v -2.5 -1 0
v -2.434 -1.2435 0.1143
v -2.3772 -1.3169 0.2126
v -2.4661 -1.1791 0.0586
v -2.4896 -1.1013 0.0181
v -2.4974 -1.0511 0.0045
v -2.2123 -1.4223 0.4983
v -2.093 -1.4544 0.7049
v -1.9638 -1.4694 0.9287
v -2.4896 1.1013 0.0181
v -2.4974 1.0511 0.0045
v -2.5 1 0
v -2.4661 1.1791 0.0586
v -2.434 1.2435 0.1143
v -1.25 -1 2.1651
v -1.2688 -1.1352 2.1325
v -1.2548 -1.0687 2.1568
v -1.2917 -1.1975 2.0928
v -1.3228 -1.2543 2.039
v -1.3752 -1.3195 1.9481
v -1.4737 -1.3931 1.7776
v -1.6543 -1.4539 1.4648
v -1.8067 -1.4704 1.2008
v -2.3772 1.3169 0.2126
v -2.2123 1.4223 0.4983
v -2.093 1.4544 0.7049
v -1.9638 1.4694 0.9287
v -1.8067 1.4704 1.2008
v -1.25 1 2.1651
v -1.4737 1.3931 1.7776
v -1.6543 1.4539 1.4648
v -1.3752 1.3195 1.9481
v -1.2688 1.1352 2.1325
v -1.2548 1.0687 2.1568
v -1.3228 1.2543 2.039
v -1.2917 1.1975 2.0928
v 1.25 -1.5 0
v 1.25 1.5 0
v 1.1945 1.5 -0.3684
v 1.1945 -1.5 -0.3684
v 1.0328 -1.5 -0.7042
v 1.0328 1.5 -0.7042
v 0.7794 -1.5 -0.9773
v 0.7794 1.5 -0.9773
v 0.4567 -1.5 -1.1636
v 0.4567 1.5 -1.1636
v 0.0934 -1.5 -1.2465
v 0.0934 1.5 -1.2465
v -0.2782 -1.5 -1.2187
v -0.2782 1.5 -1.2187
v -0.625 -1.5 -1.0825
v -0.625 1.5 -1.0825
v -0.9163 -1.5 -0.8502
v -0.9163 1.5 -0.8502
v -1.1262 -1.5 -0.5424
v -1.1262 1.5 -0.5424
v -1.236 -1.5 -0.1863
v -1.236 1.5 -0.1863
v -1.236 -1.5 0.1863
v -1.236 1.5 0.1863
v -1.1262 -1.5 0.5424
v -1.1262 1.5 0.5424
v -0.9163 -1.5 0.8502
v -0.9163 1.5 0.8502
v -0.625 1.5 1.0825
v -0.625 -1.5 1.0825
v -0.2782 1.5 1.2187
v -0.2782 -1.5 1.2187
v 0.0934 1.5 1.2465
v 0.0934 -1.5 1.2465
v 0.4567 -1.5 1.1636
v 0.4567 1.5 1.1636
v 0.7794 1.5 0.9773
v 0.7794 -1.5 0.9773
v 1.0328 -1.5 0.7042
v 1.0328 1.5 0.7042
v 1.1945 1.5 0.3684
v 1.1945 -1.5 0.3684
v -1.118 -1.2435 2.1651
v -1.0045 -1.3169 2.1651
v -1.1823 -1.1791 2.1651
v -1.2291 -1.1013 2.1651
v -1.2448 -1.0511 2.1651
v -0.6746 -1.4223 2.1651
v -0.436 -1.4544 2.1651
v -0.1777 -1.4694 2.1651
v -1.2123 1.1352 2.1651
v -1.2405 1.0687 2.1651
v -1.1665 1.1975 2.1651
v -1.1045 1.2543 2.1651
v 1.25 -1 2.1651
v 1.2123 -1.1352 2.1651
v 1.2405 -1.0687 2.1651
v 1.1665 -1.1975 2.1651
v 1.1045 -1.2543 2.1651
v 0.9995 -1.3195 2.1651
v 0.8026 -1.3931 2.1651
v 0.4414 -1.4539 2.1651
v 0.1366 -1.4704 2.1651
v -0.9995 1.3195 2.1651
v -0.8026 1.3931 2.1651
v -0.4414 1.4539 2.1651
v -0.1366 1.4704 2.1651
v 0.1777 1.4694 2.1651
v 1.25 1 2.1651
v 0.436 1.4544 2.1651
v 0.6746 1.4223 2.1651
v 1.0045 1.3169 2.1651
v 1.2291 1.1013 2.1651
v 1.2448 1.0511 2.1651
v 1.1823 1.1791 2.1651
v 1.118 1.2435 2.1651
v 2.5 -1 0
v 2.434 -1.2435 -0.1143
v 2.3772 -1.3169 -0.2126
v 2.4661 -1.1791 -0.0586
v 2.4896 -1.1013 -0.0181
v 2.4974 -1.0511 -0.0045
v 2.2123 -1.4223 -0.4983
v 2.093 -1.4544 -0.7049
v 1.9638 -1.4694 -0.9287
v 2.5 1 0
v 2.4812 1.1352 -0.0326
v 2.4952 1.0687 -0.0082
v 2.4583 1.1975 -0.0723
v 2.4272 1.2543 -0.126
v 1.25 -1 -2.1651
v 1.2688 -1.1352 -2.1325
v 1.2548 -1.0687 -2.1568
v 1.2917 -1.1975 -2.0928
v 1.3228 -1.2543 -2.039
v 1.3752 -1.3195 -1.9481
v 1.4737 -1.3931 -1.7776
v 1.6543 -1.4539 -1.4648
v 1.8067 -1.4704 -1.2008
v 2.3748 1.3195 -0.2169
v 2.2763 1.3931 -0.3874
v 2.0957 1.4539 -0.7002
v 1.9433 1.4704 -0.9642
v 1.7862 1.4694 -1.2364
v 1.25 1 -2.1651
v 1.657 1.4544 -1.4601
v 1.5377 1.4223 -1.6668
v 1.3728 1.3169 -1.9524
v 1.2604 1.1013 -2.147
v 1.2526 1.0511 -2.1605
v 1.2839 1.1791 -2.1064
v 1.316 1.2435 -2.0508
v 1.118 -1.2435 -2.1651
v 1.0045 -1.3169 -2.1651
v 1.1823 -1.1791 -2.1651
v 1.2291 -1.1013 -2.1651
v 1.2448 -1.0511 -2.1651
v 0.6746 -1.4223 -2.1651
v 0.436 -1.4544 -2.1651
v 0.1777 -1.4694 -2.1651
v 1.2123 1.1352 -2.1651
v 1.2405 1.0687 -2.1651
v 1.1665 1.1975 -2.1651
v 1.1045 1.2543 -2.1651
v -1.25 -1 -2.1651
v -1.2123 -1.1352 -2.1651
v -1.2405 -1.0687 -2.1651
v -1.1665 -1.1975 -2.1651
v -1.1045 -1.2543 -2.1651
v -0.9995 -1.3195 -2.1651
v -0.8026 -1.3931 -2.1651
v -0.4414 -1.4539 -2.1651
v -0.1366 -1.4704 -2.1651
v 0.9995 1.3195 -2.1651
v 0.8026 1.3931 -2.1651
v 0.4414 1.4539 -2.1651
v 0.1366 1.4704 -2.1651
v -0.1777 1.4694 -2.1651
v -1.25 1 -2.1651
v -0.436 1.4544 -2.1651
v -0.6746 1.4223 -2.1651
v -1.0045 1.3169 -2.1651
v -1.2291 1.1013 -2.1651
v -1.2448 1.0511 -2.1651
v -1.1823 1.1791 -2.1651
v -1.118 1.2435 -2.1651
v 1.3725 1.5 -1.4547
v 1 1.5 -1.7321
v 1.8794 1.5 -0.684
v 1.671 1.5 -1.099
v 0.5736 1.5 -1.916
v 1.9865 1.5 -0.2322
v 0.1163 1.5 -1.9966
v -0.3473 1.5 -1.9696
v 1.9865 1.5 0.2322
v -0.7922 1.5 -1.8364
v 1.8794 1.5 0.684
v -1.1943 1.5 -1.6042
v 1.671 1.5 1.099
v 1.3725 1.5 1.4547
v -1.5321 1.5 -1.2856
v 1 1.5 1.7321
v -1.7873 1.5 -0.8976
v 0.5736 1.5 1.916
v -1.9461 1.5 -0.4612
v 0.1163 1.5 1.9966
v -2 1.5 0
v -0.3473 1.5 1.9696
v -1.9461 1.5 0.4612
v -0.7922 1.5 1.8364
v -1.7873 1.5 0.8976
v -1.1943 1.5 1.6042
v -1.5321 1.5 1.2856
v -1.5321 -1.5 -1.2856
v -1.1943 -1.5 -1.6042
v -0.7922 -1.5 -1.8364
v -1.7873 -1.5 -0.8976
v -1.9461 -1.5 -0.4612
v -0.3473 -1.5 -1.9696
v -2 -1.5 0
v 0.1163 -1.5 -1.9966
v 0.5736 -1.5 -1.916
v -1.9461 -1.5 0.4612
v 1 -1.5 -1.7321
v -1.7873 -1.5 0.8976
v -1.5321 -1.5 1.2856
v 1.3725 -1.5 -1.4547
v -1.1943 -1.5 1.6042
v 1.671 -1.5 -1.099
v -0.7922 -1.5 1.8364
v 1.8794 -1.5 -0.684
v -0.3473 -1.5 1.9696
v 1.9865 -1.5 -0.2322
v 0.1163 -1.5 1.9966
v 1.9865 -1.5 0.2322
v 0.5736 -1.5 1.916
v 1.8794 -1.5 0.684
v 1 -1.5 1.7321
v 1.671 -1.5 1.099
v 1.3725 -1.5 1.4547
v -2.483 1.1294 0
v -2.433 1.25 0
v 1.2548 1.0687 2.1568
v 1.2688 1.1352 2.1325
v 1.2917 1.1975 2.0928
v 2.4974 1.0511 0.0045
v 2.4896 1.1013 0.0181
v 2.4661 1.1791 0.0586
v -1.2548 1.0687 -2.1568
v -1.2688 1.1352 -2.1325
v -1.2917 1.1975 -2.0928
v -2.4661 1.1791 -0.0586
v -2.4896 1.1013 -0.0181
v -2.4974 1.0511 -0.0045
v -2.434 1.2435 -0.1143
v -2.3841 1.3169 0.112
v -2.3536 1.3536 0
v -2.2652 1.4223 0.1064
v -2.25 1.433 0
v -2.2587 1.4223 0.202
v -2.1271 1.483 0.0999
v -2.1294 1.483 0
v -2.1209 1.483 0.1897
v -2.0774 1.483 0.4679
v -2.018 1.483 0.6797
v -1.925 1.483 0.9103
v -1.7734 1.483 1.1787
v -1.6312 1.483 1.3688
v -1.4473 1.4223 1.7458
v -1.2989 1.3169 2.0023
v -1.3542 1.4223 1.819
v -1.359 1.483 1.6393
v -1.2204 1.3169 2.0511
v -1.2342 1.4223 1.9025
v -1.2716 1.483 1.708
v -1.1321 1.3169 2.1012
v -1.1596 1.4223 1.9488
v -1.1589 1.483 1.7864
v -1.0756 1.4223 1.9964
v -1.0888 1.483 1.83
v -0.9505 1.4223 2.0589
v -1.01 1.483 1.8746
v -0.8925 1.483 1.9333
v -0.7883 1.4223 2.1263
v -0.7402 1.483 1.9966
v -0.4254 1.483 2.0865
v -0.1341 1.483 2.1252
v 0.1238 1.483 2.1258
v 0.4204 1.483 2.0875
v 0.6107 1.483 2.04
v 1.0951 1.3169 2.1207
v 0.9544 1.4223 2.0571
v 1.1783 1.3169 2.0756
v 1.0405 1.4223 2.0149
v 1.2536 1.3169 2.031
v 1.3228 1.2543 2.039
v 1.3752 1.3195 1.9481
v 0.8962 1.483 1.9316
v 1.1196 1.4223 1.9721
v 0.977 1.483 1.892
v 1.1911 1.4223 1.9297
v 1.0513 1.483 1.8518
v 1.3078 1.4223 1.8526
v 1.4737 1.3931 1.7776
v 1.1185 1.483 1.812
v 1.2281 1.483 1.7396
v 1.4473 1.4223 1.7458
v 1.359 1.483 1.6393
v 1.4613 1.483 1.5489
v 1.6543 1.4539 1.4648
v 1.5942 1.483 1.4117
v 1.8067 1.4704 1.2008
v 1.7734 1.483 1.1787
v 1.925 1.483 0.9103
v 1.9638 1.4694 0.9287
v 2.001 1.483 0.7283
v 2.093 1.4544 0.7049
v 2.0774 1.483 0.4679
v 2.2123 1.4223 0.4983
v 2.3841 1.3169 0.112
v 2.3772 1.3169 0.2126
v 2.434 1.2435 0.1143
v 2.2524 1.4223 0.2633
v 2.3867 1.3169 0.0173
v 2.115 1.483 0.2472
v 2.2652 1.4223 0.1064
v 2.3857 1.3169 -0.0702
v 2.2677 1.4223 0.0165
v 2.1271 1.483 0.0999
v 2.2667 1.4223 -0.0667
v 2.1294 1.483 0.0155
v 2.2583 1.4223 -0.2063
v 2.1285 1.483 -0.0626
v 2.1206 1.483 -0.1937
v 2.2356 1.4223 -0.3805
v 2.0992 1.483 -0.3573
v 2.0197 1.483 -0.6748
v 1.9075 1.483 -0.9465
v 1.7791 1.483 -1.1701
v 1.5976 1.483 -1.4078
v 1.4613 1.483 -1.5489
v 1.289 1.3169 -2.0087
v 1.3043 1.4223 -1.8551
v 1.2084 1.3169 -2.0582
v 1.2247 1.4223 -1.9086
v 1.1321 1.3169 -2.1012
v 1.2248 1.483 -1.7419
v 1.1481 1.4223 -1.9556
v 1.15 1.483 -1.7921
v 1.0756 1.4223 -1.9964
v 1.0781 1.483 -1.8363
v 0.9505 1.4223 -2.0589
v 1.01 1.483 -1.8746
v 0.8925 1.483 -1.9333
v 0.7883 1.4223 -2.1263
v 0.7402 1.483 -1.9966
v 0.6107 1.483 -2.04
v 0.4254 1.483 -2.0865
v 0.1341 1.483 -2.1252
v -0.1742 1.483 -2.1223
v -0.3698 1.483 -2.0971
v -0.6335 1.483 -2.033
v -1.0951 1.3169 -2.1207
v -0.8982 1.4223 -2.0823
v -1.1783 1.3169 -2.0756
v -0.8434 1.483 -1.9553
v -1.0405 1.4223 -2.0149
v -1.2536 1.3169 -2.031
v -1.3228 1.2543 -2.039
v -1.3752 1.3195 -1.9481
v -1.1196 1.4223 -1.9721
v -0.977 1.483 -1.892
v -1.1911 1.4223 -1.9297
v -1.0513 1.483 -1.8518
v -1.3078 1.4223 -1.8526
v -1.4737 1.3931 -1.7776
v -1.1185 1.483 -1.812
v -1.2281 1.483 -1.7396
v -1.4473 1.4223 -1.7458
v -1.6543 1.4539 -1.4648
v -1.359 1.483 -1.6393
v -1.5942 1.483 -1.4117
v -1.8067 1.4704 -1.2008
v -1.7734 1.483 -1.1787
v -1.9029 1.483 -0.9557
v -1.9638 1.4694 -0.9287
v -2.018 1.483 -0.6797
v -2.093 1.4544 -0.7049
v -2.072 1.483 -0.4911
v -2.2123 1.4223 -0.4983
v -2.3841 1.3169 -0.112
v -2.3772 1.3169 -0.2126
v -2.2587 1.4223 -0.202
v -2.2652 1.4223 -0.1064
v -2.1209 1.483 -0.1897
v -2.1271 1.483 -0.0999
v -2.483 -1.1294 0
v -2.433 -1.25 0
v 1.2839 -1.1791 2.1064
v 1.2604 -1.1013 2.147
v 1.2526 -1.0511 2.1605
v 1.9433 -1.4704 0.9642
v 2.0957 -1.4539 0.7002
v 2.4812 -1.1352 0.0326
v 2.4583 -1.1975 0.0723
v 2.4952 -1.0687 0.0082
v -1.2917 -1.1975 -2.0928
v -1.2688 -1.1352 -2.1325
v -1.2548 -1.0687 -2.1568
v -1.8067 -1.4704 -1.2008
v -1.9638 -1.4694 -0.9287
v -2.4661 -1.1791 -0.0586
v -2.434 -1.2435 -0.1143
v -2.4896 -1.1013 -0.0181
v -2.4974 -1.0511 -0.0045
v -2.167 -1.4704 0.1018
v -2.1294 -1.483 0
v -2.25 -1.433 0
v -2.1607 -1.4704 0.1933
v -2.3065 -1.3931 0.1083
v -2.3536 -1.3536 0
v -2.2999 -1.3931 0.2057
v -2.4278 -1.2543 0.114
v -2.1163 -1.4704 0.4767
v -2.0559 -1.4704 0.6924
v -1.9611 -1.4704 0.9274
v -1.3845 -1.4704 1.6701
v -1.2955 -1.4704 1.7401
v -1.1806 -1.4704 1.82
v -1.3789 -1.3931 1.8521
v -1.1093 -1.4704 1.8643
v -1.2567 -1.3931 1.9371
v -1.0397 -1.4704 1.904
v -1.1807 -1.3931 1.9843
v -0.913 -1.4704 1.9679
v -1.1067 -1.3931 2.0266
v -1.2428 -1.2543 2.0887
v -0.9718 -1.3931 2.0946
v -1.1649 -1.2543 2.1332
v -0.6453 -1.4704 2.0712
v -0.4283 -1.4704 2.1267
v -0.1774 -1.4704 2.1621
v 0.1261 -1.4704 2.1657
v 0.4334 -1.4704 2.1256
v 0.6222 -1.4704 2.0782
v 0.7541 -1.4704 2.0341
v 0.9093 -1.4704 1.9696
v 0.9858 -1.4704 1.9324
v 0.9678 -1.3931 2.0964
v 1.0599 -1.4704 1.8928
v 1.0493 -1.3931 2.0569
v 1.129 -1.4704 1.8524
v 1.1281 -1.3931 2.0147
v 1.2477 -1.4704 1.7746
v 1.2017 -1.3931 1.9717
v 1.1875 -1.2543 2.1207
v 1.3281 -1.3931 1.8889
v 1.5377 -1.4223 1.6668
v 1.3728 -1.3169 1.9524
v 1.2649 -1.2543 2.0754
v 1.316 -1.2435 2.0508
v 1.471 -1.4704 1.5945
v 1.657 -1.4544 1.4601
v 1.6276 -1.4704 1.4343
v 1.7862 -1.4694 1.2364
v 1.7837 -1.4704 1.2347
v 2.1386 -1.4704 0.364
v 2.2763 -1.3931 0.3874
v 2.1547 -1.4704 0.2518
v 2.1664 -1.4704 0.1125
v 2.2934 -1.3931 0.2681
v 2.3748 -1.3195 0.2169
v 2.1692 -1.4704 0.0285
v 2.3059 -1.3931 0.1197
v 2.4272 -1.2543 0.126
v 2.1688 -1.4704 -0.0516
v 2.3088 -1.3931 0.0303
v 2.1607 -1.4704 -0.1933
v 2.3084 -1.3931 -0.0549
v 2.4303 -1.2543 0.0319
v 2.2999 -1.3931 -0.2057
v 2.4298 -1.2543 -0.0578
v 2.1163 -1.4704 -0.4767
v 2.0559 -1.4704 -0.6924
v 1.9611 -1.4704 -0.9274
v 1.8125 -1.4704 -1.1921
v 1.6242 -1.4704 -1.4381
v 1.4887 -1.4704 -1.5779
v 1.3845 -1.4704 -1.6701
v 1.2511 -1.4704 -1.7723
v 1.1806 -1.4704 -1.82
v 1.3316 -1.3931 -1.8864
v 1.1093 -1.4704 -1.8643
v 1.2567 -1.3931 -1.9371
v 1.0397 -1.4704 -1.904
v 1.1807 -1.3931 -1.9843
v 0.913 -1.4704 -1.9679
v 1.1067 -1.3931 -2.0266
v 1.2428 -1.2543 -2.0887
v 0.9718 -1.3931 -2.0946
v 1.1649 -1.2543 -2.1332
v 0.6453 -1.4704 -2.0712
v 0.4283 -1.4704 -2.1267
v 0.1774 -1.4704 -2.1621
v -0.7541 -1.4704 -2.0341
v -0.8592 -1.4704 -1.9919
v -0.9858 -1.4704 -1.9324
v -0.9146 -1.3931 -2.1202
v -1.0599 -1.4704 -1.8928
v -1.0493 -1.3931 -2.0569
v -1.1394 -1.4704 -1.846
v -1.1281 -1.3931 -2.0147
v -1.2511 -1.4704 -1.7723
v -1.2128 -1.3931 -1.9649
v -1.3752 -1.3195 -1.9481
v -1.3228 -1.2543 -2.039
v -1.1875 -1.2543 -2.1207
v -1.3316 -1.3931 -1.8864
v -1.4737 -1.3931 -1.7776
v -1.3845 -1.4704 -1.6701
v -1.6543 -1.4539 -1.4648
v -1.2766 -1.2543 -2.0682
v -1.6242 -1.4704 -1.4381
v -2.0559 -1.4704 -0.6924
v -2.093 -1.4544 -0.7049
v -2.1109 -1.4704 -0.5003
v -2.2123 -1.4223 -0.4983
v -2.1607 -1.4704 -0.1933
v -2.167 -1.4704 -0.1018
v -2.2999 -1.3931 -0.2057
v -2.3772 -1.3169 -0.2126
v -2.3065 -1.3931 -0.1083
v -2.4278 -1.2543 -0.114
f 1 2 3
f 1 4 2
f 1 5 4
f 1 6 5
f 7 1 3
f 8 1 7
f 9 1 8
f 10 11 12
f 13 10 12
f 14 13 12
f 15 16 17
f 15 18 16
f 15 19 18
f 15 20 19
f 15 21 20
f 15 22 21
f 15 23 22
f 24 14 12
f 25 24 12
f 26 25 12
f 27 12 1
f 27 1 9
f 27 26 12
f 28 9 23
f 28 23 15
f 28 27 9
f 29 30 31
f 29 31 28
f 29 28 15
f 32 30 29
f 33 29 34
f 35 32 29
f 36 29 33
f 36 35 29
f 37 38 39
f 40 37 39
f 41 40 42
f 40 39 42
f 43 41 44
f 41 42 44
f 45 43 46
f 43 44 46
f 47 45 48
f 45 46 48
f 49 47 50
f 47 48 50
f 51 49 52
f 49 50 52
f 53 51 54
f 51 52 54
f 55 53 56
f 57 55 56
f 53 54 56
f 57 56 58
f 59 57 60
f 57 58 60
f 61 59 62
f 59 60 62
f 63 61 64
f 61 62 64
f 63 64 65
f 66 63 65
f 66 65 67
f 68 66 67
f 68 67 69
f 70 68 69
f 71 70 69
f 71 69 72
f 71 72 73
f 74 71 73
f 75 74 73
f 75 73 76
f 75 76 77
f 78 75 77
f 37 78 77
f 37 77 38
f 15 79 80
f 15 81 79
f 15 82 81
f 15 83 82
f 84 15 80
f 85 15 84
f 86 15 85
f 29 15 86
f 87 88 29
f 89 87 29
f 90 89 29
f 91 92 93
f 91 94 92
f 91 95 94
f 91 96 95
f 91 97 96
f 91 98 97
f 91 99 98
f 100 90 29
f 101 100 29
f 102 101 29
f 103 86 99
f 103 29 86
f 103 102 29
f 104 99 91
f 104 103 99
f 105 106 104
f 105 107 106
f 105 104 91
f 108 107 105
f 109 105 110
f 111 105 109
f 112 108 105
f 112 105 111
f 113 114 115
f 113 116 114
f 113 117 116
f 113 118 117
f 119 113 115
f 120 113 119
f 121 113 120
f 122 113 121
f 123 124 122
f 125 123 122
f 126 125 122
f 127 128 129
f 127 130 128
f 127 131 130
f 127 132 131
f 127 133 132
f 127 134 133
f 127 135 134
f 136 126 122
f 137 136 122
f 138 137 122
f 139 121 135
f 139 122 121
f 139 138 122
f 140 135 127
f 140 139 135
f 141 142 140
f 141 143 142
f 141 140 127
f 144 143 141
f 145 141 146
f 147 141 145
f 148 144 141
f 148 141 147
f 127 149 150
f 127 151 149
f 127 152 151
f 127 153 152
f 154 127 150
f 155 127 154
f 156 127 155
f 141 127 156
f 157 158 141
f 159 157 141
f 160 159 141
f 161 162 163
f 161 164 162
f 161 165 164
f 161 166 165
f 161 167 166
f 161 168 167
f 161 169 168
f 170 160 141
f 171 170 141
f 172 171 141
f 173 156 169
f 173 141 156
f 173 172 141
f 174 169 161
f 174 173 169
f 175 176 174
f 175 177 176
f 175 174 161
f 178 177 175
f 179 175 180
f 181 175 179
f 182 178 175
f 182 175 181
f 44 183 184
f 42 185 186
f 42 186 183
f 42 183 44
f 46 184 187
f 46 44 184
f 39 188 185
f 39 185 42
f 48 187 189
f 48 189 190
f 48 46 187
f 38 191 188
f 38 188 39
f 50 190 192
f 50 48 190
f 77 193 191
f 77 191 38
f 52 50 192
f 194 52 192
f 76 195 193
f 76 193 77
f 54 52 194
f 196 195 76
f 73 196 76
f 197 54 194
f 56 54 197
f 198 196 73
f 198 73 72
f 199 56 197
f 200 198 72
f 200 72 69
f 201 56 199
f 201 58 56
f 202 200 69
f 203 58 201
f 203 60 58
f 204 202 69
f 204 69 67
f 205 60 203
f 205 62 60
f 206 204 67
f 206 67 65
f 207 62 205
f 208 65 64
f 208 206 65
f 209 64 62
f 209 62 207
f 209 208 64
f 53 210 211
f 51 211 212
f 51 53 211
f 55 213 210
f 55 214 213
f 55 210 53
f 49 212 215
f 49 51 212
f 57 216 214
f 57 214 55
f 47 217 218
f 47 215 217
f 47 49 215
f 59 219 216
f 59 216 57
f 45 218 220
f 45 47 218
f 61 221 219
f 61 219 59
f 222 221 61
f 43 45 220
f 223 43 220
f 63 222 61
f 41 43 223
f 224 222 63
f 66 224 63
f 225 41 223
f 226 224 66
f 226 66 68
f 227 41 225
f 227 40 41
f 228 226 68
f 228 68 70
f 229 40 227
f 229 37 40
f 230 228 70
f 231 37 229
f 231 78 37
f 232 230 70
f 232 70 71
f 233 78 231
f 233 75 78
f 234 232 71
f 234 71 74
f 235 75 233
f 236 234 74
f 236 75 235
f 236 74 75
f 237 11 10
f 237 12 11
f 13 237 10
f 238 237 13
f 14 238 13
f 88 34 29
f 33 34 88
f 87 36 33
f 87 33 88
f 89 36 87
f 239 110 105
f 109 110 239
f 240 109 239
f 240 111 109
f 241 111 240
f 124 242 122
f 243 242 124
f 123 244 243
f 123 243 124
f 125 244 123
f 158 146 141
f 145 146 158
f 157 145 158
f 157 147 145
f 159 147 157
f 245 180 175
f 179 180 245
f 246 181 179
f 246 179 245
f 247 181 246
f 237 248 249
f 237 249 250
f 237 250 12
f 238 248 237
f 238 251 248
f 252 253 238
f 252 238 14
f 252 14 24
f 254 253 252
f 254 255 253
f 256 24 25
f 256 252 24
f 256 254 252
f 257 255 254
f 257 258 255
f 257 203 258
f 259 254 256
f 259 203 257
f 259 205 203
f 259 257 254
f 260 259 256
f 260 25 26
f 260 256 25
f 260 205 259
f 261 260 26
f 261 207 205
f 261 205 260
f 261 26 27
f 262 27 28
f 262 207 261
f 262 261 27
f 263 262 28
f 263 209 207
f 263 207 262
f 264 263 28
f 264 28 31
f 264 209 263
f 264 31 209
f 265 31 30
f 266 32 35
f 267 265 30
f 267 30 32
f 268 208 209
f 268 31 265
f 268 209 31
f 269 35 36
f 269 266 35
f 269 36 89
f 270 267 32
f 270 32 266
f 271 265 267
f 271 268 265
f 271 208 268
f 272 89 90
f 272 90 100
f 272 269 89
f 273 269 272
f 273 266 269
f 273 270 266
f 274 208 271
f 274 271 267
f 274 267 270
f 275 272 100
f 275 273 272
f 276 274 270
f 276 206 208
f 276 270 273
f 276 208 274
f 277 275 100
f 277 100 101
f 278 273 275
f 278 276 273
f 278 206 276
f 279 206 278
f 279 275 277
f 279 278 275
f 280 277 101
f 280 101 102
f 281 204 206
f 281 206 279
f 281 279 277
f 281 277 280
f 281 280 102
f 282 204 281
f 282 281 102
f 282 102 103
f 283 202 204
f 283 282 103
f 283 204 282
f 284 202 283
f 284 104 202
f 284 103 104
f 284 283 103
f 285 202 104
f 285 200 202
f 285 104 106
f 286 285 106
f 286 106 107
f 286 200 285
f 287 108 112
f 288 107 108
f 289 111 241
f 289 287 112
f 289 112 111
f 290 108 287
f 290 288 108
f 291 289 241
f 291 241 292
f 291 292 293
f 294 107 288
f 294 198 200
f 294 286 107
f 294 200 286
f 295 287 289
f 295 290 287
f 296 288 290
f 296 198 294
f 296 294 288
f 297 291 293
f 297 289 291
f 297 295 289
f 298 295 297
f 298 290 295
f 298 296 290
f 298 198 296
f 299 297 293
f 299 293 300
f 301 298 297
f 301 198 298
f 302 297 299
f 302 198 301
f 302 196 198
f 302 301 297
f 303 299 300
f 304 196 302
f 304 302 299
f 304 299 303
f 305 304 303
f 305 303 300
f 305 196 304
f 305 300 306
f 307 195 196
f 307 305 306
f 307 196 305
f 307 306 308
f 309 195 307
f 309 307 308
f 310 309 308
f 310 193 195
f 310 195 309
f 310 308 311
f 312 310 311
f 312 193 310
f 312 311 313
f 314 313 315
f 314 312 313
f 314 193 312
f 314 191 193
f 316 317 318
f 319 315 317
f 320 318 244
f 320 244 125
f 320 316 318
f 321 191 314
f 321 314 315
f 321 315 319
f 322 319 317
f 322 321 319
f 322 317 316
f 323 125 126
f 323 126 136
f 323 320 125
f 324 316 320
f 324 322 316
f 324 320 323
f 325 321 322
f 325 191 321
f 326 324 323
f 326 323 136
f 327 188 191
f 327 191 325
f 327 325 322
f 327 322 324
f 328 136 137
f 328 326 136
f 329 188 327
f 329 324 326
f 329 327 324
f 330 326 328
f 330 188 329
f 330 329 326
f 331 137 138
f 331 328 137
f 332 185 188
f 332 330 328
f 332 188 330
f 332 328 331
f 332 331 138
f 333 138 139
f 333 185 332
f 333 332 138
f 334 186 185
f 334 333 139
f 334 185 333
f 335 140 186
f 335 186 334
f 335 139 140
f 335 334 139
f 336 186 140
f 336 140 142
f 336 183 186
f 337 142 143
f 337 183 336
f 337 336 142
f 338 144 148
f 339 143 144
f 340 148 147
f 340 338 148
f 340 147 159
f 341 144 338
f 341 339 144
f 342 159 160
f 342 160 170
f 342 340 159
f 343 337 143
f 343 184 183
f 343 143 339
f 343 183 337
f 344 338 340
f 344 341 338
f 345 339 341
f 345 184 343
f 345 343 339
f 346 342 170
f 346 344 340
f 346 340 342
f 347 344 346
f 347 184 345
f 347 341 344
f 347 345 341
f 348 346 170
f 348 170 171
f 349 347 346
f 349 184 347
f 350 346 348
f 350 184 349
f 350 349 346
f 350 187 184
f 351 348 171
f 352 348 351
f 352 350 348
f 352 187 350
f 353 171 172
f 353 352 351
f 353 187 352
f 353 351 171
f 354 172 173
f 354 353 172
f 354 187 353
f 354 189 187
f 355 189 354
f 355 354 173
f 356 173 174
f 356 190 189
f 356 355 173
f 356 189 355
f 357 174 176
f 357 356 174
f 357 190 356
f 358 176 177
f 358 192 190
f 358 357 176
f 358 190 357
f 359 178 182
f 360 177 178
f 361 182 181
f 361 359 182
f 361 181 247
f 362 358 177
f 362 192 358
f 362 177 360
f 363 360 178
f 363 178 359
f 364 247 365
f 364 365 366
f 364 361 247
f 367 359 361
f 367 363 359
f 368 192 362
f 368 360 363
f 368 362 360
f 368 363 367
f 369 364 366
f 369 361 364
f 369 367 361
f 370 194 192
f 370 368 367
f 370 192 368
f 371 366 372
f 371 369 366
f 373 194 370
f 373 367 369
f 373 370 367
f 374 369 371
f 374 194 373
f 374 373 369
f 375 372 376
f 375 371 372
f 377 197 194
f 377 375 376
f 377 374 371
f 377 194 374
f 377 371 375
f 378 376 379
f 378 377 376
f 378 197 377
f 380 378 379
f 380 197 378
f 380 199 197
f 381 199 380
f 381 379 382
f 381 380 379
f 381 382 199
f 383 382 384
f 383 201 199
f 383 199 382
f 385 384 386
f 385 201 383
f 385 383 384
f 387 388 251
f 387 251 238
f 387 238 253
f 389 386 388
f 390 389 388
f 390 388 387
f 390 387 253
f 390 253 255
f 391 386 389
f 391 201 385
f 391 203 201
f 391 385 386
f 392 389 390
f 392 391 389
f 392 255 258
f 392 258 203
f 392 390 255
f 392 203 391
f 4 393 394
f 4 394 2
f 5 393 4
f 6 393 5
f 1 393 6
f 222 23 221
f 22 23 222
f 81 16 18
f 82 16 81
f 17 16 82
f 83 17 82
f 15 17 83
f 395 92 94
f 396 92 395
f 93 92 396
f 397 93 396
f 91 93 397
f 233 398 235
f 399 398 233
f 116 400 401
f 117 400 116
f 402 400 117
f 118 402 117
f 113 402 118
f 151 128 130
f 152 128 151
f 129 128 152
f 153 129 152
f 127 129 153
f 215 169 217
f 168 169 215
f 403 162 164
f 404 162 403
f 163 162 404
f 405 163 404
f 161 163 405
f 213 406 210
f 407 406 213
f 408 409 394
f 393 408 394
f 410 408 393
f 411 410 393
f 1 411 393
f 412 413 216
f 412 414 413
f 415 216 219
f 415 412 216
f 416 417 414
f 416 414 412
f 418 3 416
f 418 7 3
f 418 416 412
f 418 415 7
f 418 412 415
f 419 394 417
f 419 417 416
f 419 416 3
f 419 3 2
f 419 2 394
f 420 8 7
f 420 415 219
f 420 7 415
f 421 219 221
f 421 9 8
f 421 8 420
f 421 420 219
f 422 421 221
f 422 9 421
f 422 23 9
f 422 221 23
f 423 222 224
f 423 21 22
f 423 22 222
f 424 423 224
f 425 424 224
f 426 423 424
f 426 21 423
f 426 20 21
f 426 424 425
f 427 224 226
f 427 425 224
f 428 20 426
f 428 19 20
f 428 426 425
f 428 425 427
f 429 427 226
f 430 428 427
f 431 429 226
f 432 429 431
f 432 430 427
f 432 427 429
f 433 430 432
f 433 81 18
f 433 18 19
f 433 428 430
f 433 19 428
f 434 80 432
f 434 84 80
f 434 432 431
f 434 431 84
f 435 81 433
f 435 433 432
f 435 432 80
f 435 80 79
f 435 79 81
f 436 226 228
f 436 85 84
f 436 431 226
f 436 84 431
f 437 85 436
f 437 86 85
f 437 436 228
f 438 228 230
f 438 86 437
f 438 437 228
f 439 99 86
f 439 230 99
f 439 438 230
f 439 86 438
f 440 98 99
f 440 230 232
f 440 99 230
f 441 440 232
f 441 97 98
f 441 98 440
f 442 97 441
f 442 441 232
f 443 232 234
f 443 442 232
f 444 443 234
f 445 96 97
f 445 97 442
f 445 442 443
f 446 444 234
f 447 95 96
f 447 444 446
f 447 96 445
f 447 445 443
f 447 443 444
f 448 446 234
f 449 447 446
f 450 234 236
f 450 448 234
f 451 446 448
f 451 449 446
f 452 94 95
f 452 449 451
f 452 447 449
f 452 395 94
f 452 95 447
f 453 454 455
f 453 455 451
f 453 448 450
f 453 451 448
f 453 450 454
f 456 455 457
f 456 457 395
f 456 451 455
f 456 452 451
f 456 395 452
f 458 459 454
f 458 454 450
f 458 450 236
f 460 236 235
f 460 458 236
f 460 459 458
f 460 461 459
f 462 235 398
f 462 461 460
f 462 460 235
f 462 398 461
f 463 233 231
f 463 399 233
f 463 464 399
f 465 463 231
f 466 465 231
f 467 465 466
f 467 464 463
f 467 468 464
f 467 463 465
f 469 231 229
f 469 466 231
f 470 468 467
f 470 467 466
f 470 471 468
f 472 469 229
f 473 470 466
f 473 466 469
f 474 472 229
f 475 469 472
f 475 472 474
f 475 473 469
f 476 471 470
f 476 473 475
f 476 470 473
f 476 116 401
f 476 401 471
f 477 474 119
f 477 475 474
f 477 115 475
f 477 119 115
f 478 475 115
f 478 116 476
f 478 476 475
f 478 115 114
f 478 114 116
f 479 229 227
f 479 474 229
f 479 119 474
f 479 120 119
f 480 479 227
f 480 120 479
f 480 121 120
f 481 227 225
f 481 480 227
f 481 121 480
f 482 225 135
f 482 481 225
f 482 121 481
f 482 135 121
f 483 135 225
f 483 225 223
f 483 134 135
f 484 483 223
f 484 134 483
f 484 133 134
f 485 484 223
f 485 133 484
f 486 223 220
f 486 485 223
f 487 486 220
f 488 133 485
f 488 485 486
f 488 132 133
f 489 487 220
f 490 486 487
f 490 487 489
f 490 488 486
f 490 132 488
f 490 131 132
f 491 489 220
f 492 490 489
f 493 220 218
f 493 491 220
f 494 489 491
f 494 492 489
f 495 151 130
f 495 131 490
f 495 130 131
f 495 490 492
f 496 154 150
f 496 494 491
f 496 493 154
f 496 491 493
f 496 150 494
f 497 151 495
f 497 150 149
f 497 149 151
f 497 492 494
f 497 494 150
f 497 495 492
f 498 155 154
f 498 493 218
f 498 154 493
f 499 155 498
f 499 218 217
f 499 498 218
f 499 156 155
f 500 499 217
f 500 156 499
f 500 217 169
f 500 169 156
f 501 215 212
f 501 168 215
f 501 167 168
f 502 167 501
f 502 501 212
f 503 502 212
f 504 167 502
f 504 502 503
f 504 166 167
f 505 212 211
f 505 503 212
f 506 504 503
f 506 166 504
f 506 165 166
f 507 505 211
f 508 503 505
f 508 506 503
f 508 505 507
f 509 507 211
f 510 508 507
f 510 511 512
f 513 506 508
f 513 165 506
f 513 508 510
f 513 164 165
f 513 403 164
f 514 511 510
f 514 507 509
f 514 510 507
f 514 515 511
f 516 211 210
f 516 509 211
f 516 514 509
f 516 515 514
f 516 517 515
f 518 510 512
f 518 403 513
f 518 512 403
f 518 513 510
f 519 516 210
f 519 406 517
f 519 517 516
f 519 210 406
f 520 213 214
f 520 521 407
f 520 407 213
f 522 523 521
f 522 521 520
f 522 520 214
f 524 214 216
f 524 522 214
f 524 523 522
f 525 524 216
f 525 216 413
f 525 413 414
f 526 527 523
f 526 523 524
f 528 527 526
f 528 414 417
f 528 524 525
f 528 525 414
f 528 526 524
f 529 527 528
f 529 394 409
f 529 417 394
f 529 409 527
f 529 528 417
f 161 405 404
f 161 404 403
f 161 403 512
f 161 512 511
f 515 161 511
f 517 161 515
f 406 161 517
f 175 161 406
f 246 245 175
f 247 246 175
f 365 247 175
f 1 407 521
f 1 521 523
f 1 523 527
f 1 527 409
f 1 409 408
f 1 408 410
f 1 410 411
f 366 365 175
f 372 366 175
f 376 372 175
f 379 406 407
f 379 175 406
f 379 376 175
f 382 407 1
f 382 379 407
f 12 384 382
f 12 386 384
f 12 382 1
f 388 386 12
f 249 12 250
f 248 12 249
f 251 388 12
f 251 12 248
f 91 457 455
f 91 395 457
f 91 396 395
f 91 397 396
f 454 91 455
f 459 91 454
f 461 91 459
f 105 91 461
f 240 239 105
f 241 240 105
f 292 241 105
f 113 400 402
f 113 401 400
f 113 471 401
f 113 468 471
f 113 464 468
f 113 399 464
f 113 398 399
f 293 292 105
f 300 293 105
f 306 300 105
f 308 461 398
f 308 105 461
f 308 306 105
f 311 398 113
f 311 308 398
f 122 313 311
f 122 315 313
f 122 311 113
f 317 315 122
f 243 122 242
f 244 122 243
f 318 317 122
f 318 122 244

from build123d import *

# Parameters (mm, degrees)
BOSS_EXTRUDE1_DEPTH = 1.5
SKETCH2_R           = 1.25
CUT_EXTRUDE1_DEPTH  = 4


with BuildPart() as part:
    # Sketch1 → Boss-Extrude1 (new body, symmetric)
    with BuildSketch(Plane(origin=(0, 0, 0), x_dir=(1, 0, 0), z_dir=(0, 1, 0))):
        Polygon((2.5, 0), (1.25, 2.165063509), (-1.25, 2.165063509), (-2.5, 0), (-1.25, -2.165063509), (1.25, -2.165063509), align=None)
    extrude(amount=BOSS_EXTRUDE1_DEPTH, both=True)

    # Sketch2 → Cut-Extrude1 (cut, through all)
    with BuildSketch(Plane(origin=(0, 1.5, 0), x_dir=(1, 0, 0), z_dir=(0, 1, 0))):
        Circle(SKETCH2_R)
    extrude(amount=-CUT_EXTRUDE1_DEPTH, mode=Mode.SUBTRACT)

    # Sketch3 → Cut-Revolve1 (revolve, cut)
    with BuildSketch(Plane.XY):
        with BuildLine():
            Line((-2, 1.5), (-1.792019958, 1.5))
            Line((-1.792019958, 1.5), (-2.45433601, 1.868931602))
            Line((-2.45433601, 1.868931602), (-2.872282185, 1.266409158))
            Line((-2.872282185, 1.266409158), (-2.5, 0.870574679))
            Line((-2.5, 0.870574679), (-2.5, 1))
            ThreePointArc((-2.5, 1), (-2.353553391, 1.353553391), (-2, 1.5))
        make_face()
        with BuildLine():
            Line((-2.5, -1), (-2.5, -0.713166542))
            Line((-2.5, -0.713166542), (-2.9927012, -1.5))
            Line((-2.9927012, -1.5), (-2.45433601, -1.839605404))
            Line((-2.45433601, -1.839605404), (-1.859208979, -1.5))
            Line((-1.859208979, -1.5), (-2, -1.5))
            ThreePointArc((-2, -1.5), (-2.353553391, -1.353553391), (-2.5, -1))
        make_face()
    revolve(axis=Axis((0, 0, 0), (0, 1, 0)), mode=Mode.SUBTRACT)


solid = part.part
